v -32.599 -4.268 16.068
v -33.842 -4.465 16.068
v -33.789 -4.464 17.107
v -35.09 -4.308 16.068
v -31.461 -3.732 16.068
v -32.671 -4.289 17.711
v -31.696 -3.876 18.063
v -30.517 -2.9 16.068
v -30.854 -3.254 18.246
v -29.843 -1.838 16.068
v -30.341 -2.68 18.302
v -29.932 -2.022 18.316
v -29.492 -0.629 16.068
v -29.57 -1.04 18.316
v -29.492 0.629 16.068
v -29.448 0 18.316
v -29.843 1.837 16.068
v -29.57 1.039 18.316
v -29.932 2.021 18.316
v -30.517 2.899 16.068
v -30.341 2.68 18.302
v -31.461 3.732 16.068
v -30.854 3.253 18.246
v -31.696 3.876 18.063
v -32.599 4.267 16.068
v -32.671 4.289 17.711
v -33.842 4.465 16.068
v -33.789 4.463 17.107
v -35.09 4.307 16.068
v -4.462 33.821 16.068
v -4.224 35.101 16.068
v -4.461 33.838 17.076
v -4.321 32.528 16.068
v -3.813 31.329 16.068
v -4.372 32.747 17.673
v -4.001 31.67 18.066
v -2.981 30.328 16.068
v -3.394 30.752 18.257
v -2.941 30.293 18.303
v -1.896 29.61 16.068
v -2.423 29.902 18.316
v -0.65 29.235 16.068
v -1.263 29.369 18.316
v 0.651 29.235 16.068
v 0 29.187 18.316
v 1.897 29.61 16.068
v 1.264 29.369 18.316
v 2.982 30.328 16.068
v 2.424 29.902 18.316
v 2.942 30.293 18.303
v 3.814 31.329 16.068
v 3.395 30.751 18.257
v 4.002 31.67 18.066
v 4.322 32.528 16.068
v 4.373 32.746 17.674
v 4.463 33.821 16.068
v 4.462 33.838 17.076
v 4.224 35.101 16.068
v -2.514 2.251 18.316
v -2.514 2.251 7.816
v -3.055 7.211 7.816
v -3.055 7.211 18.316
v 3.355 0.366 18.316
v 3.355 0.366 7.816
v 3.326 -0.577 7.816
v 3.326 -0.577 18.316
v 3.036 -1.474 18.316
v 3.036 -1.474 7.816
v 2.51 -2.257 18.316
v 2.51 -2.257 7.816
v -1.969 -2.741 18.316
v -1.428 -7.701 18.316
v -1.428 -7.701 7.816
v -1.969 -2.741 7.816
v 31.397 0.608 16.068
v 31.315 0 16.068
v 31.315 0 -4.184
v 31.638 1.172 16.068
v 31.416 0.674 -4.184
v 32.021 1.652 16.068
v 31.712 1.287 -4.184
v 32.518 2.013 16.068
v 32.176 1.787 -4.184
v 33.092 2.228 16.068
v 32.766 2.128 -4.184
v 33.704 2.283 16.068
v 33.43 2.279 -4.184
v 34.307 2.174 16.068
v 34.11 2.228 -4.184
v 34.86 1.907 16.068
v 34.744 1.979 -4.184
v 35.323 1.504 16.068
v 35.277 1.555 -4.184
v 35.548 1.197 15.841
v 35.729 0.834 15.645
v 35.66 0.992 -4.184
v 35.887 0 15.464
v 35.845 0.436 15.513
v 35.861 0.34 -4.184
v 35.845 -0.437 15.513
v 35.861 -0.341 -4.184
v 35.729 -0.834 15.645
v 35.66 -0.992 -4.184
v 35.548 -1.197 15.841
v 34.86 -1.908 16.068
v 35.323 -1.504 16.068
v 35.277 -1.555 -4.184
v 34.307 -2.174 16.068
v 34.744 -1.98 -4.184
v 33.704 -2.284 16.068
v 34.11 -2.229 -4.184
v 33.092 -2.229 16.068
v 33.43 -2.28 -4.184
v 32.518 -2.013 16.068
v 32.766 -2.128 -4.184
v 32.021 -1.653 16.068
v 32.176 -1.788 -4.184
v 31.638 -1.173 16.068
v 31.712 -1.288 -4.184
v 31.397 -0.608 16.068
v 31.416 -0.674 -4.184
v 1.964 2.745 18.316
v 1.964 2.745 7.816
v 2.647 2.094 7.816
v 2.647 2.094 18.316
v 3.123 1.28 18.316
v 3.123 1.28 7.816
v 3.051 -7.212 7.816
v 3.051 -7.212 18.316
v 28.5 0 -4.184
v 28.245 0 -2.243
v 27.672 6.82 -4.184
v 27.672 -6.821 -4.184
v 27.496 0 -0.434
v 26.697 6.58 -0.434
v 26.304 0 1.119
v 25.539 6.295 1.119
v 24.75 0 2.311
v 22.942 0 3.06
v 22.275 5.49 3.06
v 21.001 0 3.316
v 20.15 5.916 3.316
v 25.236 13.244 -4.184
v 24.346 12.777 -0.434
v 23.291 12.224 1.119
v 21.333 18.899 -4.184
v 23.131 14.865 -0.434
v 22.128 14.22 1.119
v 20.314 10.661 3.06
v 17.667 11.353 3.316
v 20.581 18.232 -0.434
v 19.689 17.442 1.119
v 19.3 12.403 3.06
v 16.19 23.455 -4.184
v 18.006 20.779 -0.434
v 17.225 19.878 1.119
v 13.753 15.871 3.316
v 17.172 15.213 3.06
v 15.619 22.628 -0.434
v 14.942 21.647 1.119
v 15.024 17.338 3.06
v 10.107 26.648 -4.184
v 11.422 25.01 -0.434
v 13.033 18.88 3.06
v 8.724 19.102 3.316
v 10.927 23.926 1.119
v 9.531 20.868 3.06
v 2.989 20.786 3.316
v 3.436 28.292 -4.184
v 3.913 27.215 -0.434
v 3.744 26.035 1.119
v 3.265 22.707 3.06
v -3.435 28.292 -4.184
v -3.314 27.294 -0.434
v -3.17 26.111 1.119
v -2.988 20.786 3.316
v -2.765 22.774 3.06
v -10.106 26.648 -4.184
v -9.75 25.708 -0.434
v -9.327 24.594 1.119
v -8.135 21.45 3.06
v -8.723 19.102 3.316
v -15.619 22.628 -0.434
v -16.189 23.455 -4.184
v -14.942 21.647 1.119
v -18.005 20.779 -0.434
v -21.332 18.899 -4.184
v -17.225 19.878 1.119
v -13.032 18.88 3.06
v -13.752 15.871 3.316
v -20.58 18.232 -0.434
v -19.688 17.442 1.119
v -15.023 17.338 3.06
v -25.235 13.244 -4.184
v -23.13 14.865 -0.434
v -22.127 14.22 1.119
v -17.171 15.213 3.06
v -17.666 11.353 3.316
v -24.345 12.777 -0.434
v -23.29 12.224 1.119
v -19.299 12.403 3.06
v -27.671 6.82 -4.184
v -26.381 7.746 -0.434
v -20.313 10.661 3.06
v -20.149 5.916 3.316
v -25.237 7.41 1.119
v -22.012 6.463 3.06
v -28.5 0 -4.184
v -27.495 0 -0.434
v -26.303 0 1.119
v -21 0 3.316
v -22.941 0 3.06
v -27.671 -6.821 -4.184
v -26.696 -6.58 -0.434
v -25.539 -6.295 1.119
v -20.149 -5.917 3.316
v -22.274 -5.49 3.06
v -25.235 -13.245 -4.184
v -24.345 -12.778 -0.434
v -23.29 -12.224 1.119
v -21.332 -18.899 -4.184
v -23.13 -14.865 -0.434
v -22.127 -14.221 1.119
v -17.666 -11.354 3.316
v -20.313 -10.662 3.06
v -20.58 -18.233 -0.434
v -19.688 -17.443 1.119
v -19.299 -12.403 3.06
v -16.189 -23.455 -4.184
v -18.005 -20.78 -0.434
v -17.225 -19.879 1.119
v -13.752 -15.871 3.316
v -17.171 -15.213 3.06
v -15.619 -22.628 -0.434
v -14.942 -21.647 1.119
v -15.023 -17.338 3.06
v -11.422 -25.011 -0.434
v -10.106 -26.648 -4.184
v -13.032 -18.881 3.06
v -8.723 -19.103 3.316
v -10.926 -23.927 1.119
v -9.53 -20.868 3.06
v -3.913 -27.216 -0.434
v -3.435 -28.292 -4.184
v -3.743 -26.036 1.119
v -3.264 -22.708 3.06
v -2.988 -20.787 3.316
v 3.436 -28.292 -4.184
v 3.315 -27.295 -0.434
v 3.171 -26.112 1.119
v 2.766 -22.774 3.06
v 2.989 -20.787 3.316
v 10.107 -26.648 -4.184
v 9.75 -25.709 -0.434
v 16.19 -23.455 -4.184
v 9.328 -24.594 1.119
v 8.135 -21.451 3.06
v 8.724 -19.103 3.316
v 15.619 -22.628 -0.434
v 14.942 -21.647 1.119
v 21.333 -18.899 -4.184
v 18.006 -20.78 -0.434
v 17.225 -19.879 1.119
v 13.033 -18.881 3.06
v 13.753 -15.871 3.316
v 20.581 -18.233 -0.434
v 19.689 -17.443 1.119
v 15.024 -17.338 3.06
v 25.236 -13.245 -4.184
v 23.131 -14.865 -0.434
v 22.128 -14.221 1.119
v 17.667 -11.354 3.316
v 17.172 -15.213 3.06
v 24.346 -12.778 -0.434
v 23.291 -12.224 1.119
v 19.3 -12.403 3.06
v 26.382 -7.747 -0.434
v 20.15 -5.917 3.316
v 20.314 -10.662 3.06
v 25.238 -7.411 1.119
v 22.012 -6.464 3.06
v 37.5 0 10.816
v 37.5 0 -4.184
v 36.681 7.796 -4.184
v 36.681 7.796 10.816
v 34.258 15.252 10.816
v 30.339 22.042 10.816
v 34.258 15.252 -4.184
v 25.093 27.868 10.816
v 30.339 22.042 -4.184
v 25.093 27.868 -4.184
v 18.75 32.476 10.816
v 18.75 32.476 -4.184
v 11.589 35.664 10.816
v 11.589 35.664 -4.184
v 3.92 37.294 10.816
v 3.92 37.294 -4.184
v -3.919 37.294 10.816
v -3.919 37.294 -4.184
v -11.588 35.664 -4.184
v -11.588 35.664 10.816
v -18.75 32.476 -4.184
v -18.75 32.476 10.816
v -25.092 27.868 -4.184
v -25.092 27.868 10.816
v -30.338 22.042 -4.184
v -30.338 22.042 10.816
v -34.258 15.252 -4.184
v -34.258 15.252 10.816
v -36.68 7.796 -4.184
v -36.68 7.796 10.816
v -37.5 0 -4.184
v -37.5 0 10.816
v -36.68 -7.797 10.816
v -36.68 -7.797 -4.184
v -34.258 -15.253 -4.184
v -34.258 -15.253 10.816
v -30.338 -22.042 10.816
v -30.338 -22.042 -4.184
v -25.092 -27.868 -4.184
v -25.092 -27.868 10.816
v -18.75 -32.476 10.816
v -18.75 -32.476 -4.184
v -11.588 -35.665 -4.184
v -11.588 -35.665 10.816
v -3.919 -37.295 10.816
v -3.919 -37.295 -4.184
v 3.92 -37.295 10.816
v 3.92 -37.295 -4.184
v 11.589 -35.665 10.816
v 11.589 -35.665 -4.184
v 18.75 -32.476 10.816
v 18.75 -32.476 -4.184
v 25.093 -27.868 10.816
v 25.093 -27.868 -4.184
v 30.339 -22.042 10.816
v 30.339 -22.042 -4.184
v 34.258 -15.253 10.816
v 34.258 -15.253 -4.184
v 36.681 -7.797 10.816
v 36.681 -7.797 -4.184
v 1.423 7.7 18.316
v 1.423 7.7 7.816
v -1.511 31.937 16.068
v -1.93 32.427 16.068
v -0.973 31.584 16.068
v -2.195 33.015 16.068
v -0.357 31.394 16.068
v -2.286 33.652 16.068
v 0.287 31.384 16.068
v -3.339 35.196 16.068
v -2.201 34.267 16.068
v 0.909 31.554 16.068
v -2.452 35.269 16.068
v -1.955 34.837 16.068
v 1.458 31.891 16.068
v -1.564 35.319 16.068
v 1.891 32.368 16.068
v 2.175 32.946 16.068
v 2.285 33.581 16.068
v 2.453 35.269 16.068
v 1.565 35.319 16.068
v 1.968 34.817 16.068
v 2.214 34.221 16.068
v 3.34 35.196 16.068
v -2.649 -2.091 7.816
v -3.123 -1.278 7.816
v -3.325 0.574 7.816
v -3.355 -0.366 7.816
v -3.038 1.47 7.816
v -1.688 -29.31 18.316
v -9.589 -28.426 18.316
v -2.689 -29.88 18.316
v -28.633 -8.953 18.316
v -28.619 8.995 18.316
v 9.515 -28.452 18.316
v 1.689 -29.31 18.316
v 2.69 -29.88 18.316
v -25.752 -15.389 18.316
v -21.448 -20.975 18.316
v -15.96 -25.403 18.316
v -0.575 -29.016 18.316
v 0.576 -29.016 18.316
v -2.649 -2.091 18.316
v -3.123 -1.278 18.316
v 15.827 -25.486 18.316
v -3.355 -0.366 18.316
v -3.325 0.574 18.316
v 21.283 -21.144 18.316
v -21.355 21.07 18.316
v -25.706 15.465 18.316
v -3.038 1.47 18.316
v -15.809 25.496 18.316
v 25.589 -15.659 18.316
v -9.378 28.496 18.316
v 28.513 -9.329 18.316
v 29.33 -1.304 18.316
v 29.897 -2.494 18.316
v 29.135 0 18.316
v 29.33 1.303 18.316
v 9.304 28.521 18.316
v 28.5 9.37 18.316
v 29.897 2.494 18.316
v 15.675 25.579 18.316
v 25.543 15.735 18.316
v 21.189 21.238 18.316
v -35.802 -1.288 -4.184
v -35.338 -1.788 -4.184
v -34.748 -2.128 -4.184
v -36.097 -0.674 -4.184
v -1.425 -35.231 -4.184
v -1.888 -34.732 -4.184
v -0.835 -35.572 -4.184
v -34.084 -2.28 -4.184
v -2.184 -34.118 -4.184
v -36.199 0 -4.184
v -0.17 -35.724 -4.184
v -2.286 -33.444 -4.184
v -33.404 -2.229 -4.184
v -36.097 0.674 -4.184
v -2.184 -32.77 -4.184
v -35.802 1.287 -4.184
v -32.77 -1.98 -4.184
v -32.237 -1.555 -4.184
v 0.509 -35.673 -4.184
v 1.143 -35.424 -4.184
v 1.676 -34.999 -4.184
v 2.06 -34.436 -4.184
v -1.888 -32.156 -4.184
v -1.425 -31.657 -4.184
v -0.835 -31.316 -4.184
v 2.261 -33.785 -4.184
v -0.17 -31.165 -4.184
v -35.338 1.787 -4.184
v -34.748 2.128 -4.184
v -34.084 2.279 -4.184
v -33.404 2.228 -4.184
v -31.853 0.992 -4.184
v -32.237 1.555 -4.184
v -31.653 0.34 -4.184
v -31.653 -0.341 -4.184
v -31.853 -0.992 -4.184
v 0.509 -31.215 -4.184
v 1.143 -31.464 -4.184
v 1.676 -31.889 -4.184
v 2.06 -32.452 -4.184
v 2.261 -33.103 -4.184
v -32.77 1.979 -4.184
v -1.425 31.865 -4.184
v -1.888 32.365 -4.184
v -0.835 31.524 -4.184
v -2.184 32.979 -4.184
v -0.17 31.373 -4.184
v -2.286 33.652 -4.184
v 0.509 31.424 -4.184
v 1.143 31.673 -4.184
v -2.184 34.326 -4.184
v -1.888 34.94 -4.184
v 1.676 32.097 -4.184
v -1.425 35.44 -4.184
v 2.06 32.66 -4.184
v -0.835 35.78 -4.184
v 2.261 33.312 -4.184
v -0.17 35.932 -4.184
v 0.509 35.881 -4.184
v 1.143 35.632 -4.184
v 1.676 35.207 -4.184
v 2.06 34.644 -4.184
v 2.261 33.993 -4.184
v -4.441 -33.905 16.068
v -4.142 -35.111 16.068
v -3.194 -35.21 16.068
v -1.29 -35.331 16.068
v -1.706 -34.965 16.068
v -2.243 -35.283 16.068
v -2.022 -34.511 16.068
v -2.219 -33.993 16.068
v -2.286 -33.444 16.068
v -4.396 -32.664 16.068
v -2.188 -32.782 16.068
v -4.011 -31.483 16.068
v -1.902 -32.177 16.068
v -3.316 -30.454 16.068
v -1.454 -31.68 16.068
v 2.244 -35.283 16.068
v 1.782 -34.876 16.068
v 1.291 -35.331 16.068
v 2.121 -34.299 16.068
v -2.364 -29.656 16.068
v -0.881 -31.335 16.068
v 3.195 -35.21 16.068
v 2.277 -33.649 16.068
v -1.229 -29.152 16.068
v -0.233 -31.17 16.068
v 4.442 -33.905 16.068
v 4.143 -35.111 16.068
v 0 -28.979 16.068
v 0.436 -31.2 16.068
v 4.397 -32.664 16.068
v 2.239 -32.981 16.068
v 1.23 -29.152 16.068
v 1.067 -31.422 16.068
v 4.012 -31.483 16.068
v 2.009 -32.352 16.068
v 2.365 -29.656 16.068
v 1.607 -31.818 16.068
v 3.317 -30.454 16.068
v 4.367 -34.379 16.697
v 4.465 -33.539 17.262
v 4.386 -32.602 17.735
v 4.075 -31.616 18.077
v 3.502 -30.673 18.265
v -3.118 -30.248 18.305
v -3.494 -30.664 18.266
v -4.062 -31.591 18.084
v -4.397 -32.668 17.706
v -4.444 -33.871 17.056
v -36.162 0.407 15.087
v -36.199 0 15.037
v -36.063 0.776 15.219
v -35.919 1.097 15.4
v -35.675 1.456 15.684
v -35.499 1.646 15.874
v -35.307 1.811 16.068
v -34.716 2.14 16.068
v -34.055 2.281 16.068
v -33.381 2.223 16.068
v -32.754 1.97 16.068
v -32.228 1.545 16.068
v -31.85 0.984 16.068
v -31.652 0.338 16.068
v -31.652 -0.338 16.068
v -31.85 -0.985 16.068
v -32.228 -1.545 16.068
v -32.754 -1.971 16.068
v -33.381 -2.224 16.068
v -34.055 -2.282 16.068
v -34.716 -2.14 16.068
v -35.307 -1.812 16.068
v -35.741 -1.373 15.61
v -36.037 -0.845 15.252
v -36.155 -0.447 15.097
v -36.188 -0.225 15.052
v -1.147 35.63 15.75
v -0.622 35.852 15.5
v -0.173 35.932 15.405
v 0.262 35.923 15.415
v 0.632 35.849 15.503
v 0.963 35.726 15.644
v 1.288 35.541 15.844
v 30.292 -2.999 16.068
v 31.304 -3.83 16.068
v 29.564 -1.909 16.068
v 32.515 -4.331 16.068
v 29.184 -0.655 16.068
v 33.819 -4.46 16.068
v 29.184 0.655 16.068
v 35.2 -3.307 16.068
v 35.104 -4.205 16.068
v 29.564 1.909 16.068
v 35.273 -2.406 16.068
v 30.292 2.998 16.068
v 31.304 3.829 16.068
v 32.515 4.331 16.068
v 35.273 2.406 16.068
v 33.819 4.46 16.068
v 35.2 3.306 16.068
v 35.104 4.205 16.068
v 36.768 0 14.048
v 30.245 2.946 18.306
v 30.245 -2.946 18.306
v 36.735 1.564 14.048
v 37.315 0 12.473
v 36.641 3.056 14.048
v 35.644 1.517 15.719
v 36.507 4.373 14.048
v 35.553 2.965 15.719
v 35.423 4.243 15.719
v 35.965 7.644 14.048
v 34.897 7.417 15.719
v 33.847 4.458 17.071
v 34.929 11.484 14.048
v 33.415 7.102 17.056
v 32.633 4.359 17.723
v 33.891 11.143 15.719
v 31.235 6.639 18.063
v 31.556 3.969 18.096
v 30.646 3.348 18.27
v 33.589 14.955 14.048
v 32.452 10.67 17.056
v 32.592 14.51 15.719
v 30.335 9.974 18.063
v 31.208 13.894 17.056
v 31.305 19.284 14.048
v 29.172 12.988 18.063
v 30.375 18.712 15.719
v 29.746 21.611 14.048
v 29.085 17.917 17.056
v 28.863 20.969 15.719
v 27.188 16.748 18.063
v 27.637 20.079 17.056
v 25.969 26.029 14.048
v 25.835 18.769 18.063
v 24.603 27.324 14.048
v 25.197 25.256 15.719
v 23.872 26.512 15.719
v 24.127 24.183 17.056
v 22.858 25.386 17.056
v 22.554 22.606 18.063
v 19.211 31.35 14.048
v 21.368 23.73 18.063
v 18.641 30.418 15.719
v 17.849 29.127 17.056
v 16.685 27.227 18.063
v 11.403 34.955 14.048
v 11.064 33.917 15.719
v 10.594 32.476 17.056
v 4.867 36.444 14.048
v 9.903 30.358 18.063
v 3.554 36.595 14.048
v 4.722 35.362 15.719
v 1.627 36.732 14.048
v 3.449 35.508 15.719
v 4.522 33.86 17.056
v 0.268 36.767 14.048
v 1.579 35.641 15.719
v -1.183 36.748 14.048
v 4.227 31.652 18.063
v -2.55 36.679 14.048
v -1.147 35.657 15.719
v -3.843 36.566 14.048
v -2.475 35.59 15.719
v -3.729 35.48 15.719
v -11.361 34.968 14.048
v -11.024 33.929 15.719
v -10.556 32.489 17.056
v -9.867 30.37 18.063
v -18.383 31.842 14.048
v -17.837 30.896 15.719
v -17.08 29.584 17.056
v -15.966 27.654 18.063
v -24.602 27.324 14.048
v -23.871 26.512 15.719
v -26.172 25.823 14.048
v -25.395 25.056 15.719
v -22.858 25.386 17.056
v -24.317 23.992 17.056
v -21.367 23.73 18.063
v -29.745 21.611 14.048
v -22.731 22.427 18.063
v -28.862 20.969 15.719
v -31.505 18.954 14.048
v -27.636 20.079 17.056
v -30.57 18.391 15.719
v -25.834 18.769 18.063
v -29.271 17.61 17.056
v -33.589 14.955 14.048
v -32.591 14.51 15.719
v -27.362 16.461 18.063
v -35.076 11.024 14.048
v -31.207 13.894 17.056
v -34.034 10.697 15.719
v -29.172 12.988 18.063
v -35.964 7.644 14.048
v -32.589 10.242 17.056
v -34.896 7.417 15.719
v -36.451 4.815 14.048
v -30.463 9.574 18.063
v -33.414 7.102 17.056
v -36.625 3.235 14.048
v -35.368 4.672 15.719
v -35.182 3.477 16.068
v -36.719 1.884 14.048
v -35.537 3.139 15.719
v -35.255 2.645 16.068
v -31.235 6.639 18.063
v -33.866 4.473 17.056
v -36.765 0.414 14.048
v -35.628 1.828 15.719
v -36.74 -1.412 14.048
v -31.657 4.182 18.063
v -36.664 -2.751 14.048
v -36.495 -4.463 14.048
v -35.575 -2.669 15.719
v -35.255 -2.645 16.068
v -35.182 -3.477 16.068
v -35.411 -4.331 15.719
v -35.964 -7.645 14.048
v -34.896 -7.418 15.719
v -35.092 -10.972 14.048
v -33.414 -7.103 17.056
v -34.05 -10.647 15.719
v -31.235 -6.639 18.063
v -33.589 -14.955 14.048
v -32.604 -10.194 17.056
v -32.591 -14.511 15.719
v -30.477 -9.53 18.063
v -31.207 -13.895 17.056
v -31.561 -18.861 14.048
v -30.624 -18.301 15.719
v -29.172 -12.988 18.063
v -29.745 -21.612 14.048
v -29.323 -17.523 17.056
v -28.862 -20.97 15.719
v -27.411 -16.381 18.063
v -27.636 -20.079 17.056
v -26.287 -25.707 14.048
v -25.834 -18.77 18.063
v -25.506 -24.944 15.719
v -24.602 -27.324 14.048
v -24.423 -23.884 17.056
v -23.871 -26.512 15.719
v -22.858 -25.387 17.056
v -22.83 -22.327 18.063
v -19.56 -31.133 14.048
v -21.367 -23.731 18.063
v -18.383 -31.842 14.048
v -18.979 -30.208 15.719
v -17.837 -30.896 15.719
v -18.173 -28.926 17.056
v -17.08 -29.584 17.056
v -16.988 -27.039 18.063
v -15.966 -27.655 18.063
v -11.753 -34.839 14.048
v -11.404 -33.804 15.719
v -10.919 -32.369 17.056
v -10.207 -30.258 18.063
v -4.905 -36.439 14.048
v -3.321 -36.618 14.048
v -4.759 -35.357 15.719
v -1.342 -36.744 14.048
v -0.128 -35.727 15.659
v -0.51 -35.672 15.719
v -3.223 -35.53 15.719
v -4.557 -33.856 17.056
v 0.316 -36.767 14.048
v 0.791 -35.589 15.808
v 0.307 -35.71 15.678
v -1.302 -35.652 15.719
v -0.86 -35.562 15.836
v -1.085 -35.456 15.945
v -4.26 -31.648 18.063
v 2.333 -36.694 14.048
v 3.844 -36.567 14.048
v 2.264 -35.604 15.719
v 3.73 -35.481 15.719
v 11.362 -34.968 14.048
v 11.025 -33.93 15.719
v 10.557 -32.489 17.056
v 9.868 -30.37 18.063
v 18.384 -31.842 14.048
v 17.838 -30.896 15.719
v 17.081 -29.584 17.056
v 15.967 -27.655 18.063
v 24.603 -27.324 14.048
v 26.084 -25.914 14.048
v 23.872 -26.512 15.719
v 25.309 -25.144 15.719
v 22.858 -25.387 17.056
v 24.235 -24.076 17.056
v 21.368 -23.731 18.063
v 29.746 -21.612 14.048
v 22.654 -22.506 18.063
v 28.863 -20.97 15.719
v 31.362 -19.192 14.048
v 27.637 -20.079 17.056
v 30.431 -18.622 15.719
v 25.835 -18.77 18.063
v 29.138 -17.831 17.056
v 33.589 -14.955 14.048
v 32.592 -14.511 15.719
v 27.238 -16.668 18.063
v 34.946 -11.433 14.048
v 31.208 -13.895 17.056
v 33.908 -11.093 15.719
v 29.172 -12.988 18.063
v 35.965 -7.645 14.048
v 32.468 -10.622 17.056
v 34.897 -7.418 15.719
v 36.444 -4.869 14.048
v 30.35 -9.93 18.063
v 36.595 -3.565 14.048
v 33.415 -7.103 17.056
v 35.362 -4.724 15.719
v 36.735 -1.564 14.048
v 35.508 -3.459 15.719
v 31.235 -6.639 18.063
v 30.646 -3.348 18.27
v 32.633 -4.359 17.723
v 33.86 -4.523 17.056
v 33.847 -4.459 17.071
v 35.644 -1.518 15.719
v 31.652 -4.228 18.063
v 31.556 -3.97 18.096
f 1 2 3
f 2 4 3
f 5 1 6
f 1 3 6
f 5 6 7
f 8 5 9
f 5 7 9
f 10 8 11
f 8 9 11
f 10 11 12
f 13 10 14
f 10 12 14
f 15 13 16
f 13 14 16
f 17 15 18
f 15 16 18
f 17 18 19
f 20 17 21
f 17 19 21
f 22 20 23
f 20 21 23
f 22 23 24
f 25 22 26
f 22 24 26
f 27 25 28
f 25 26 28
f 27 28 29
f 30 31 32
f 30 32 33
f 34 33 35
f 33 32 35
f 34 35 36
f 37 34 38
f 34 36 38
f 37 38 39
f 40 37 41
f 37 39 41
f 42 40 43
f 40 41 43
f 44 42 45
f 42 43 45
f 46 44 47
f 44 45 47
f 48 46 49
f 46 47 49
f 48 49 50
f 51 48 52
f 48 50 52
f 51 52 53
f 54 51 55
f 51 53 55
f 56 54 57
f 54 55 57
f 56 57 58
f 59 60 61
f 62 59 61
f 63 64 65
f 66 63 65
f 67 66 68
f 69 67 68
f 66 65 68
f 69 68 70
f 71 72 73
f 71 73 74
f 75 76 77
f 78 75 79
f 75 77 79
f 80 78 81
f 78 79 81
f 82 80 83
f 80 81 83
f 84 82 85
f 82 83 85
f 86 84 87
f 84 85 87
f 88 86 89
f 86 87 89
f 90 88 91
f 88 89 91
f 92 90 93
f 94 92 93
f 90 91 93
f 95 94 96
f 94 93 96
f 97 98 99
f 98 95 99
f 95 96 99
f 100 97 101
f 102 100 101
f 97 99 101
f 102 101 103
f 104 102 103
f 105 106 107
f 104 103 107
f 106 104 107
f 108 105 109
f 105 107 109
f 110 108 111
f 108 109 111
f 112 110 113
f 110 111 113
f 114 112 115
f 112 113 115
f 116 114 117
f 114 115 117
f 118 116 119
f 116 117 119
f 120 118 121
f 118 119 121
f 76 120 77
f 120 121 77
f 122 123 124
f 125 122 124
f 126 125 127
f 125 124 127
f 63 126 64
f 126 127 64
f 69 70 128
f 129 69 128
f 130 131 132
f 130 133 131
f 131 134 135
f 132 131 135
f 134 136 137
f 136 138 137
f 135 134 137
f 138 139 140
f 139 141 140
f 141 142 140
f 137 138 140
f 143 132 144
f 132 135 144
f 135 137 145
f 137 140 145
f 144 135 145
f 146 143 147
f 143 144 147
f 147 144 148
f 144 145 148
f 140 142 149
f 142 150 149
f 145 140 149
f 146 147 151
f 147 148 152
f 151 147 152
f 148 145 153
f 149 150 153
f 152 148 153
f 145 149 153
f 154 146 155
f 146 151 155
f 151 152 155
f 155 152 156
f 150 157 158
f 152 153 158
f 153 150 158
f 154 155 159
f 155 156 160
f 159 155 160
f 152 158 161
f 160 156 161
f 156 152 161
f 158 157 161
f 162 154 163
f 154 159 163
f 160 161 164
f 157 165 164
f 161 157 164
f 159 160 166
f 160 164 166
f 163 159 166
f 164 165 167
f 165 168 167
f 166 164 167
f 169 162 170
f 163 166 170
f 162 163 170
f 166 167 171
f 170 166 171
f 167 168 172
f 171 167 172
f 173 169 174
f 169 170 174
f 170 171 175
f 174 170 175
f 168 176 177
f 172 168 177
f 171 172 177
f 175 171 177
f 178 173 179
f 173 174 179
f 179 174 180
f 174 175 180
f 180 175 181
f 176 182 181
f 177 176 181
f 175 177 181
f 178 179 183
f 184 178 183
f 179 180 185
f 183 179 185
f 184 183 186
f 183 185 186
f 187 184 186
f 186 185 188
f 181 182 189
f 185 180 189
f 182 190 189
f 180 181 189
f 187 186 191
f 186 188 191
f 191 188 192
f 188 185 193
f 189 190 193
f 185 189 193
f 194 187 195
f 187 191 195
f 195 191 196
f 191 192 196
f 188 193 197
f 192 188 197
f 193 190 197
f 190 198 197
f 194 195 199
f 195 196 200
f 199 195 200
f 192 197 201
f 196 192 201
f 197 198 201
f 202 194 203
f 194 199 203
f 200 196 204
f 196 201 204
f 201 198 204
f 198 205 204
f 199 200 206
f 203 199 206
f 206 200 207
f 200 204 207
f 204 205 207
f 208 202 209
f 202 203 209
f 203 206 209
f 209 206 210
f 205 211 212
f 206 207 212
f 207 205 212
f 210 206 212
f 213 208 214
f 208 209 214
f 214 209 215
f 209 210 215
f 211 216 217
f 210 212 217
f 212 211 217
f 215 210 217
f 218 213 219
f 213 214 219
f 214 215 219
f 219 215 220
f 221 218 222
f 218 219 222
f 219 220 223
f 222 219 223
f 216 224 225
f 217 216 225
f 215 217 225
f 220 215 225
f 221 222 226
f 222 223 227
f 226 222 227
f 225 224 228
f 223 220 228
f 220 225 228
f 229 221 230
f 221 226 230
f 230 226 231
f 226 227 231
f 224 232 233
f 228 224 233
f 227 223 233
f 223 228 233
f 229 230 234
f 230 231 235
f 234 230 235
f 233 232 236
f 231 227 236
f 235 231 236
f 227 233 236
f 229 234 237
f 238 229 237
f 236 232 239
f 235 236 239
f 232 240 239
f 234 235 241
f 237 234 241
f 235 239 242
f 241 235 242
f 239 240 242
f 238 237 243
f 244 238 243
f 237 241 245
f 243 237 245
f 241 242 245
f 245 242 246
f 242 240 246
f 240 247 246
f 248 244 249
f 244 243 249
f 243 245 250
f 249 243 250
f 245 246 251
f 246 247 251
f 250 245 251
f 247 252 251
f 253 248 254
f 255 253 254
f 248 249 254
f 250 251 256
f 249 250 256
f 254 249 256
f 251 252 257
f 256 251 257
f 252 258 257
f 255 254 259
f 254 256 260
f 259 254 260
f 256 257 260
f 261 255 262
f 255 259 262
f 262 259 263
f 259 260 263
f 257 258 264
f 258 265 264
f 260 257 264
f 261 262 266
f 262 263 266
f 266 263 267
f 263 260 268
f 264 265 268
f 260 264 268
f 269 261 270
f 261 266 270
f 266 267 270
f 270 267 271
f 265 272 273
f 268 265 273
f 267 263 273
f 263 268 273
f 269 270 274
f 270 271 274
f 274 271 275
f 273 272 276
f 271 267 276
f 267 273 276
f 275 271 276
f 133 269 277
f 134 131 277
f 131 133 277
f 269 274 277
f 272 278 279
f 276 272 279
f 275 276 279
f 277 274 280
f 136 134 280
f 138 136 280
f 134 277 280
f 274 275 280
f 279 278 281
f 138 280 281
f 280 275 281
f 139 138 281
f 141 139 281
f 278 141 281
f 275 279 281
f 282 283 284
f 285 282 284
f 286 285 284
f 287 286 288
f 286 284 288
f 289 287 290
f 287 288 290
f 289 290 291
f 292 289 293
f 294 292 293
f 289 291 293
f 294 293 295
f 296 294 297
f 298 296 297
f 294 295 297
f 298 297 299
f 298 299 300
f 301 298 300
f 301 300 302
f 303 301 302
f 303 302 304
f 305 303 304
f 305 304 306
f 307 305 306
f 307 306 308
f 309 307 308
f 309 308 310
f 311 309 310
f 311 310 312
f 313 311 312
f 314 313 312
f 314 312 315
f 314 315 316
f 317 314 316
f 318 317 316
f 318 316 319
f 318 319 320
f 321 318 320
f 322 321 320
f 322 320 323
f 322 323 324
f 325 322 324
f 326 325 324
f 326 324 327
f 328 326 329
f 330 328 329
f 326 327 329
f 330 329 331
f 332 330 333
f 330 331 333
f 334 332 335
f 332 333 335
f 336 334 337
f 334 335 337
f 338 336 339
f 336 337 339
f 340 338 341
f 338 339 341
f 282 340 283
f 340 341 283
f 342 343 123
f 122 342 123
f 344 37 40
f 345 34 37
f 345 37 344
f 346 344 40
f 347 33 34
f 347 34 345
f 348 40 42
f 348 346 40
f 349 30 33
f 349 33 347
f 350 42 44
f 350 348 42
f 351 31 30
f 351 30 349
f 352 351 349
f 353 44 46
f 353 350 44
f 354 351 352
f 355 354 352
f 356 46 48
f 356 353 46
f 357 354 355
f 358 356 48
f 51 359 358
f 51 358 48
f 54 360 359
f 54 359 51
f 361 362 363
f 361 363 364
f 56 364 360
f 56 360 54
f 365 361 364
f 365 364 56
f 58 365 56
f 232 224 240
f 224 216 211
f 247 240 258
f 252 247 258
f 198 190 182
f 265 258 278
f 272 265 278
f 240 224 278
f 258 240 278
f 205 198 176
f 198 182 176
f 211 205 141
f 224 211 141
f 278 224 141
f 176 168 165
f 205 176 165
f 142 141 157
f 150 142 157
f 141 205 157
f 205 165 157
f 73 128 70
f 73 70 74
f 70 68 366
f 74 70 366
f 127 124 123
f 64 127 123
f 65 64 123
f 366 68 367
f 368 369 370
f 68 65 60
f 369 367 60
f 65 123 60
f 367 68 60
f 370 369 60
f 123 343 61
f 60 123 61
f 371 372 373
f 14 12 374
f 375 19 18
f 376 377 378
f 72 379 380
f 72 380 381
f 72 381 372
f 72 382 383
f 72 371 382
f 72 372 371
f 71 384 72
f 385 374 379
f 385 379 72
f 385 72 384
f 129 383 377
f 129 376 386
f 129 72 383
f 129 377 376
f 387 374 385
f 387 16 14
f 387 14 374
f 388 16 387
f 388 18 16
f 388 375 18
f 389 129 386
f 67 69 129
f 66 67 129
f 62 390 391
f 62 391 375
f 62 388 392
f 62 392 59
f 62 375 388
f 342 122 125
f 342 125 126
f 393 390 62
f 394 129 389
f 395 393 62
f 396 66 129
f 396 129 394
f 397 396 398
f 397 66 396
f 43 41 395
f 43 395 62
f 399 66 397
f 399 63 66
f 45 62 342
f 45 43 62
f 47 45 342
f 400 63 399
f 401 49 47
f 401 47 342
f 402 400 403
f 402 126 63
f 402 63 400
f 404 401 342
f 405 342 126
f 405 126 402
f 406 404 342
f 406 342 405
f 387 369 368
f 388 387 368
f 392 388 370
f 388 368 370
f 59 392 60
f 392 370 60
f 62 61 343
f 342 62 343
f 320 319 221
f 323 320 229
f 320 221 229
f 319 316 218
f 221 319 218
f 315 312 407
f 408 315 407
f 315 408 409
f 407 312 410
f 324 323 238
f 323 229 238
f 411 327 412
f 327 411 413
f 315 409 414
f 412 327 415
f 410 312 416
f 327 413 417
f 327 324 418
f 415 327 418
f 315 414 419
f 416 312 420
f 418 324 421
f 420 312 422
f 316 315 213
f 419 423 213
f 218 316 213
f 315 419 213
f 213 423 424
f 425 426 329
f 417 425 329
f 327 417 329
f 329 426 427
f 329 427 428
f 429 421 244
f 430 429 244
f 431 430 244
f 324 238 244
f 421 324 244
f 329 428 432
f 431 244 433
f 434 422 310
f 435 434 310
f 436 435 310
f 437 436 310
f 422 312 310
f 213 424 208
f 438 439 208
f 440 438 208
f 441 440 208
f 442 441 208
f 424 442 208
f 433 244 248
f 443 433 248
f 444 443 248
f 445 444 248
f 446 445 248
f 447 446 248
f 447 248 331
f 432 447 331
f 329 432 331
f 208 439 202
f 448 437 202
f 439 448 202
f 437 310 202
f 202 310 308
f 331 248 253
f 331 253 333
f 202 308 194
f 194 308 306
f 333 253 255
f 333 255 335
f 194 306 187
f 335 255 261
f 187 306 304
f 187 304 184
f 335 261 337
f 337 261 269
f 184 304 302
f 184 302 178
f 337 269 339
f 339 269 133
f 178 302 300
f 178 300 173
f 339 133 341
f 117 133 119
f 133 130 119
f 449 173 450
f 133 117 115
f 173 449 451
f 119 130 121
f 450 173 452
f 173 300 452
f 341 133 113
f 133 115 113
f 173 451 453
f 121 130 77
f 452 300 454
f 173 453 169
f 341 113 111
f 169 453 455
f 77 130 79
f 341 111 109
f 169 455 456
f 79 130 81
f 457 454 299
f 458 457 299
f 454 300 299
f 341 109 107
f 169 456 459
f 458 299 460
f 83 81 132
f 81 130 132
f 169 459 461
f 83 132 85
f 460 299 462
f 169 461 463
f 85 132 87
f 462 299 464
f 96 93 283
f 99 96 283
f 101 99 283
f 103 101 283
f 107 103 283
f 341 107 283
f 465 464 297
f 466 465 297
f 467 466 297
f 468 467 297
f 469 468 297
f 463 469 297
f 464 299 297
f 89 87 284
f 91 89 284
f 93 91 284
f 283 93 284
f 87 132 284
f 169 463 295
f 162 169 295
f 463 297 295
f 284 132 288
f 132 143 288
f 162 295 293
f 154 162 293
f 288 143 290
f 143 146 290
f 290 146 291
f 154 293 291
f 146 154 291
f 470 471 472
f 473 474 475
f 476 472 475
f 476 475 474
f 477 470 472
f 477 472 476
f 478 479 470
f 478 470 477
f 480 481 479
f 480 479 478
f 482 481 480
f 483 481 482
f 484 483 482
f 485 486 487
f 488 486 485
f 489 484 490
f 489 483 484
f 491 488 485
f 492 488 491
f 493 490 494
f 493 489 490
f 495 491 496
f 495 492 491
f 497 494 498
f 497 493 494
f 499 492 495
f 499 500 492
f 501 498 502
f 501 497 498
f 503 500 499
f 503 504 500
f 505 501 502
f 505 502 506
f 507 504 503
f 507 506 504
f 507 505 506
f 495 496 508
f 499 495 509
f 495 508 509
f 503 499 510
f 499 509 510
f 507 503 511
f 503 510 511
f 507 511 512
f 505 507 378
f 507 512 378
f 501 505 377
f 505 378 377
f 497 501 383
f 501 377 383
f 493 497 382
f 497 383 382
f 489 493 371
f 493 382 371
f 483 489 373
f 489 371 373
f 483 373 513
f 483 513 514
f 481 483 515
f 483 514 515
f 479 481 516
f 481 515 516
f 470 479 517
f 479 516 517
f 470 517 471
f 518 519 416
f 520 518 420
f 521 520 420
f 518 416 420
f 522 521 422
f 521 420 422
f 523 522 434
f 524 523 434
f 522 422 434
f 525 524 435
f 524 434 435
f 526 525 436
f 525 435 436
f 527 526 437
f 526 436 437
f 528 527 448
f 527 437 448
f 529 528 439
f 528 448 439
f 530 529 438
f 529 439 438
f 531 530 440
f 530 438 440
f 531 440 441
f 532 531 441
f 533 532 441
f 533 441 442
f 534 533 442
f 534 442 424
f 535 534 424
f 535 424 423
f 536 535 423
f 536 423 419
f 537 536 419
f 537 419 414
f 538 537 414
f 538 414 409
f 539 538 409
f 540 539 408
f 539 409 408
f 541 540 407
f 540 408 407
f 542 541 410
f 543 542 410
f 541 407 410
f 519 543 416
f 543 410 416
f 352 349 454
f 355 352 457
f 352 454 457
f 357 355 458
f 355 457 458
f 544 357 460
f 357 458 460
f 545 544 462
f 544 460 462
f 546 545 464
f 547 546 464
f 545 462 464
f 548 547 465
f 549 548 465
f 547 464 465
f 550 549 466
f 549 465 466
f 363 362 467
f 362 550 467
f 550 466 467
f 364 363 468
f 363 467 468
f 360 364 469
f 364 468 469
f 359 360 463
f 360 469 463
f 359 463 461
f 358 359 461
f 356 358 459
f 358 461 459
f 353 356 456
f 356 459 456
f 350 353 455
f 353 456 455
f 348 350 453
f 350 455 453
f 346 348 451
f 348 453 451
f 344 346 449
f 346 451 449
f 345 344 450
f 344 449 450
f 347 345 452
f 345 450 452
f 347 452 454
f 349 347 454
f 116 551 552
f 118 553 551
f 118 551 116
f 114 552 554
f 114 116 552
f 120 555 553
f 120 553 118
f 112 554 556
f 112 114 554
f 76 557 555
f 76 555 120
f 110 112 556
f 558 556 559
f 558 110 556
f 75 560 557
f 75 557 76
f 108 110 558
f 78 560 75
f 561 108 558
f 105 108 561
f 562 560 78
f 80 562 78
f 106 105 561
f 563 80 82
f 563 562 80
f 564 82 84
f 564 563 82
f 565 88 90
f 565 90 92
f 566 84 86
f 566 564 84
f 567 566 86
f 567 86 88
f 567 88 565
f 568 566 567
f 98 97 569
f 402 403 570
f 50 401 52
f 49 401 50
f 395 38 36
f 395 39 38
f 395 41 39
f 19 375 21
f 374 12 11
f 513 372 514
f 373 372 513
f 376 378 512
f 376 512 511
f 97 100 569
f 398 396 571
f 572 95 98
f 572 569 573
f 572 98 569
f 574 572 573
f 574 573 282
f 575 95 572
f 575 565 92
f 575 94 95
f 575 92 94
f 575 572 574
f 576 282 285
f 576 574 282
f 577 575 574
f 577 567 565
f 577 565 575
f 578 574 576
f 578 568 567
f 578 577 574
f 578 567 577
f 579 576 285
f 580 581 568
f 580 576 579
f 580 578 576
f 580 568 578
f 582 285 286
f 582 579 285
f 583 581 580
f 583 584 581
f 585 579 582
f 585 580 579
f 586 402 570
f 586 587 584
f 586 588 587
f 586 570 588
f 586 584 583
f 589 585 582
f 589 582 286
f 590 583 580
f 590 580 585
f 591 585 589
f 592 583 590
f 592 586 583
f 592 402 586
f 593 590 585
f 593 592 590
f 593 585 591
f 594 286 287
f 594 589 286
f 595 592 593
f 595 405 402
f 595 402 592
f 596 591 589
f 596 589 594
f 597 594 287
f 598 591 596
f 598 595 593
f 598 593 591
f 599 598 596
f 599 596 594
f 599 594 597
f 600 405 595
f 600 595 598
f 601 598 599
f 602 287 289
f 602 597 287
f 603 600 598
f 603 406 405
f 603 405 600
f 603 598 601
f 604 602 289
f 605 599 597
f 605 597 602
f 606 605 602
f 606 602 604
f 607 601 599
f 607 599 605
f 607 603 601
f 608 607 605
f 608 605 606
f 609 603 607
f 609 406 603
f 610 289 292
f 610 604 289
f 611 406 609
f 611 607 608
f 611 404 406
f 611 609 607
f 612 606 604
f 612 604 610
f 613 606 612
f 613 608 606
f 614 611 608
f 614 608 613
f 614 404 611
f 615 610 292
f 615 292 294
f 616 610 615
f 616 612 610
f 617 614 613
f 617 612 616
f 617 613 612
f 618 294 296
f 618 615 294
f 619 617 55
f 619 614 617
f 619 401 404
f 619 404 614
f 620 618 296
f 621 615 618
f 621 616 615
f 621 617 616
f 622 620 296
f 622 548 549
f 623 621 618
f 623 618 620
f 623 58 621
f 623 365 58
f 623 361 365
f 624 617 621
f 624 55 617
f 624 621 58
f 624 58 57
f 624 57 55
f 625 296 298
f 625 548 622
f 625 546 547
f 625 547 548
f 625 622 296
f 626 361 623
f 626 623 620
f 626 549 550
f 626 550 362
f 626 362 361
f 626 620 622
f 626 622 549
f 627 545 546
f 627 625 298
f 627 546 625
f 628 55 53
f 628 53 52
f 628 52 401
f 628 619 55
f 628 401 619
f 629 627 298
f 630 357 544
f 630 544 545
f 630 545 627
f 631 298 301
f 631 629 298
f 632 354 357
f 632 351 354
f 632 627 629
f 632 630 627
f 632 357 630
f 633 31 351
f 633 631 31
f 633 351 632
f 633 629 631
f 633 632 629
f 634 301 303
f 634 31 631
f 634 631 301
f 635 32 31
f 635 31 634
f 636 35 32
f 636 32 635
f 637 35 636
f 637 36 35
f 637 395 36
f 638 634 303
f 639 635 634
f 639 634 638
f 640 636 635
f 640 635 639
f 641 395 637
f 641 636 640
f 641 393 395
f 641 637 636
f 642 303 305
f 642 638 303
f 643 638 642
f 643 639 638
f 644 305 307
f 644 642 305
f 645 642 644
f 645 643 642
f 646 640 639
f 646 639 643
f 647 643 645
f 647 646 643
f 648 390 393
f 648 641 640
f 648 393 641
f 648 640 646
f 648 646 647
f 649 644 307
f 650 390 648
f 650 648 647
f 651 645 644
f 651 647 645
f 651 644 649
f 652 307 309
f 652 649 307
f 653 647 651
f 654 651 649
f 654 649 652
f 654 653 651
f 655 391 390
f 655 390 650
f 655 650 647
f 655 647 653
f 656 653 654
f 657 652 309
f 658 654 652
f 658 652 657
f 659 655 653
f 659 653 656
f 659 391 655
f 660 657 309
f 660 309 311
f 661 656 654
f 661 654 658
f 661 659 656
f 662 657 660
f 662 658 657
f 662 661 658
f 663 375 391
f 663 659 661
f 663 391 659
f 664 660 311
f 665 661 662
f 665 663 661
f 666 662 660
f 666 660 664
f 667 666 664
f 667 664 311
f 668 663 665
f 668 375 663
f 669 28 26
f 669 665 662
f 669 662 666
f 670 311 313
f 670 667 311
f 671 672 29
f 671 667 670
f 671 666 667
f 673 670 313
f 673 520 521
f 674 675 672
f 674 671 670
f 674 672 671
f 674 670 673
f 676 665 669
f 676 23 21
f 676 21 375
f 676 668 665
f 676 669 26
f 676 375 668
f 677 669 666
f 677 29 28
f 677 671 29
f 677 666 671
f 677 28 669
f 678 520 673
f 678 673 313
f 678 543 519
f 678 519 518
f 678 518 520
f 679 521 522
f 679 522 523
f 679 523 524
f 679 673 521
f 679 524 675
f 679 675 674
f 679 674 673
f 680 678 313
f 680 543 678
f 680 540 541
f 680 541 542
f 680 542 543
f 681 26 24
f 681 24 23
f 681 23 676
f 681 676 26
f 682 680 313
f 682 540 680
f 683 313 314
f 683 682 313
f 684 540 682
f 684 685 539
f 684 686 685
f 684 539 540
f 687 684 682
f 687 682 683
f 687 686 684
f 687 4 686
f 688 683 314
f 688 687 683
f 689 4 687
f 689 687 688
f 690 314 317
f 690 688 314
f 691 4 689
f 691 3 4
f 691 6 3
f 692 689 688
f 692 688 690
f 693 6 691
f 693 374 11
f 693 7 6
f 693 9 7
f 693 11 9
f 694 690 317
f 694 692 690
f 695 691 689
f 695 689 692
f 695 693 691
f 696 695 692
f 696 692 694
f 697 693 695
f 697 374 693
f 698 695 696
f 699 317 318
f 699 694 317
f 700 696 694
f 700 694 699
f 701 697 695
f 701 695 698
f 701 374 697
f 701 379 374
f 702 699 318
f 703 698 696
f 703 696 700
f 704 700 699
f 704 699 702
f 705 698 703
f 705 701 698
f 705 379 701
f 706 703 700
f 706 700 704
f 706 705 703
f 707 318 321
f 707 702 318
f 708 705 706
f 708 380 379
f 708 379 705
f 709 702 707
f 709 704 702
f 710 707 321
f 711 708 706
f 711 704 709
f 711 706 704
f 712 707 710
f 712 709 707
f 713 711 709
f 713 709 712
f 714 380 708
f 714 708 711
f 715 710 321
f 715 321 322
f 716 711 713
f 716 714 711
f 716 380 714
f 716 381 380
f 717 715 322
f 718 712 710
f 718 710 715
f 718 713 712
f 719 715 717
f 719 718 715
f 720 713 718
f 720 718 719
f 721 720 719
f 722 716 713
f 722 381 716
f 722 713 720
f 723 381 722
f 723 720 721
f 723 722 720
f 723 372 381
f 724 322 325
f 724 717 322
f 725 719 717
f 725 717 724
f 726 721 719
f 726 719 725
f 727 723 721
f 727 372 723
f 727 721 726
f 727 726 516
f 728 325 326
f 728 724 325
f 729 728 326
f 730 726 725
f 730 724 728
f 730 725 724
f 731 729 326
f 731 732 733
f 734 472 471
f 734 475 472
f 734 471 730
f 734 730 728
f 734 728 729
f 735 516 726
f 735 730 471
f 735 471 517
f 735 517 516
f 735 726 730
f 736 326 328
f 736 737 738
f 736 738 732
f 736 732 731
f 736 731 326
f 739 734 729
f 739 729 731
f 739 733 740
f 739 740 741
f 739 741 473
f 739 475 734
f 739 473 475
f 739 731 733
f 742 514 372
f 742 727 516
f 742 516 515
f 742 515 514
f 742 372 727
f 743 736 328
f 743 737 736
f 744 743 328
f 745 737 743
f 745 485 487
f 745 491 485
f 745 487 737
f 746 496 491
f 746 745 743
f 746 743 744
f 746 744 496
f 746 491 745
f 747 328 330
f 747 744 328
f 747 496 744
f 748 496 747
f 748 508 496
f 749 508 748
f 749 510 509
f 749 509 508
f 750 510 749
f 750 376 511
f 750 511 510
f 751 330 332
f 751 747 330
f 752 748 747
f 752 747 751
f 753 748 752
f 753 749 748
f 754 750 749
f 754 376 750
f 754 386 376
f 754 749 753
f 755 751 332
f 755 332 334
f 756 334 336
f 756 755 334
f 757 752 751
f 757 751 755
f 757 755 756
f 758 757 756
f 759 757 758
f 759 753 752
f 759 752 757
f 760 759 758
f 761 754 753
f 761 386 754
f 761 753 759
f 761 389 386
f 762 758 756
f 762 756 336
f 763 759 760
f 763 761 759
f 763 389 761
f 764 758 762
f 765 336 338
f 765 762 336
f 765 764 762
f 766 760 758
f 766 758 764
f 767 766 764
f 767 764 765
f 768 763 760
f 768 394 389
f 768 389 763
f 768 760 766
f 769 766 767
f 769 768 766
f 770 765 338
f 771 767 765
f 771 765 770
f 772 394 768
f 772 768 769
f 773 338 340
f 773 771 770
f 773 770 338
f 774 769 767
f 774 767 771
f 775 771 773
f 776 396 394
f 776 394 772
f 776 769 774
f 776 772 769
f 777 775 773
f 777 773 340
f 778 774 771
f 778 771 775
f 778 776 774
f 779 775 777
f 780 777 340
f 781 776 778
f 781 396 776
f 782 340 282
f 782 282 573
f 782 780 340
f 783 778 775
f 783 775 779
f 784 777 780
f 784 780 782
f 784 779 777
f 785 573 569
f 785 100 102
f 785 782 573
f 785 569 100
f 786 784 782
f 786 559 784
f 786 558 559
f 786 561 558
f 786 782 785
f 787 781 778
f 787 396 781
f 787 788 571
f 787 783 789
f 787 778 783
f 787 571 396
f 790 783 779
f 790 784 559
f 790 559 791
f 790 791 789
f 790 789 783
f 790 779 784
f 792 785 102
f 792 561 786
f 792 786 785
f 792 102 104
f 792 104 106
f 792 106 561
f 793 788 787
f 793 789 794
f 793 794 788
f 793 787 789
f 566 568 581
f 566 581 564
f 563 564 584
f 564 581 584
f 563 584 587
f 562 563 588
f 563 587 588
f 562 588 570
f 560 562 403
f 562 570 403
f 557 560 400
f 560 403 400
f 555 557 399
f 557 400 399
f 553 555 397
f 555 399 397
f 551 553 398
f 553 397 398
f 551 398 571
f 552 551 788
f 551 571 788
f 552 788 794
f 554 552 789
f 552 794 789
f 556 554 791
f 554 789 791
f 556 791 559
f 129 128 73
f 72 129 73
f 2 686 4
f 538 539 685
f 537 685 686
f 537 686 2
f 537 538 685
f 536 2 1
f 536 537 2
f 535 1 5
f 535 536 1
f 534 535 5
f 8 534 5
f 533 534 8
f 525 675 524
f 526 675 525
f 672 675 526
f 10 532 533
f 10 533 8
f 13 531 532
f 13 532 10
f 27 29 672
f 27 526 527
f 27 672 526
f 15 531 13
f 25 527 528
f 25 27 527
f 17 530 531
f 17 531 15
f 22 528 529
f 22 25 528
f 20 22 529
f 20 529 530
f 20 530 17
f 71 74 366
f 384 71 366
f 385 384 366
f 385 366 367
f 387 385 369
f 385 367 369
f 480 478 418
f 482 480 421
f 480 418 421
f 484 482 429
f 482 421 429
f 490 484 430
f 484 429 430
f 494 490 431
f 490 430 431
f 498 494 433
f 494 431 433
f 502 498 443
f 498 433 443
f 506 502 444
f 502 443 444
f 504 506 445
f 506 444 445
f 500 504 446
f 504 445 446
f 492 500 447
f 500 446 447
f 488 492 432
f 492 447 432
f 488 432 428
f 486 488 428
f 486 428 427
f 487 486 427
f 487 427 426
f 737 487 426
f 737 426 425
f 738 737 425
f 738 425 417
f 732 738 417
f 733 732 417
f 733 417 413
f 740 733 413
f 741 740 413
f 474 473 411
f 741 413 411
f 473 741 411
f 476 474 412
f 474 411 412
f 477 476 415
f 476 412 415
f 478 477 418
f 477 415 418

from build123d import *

# Parameters (mm, degrees)
SKETCH1_R                                           = 25
SKETCH1_R_2                                         = 19
BOSS_EXTRUDE1_DEPTH                                 = 5
SKETCH2_R                                           = 25
BOSS_EXTRUDE2_DEPTH                                 = 10
FILLET1_R                                           = 5
CBORE_FOR_3_BINDING_HEAD_MACHINE_SCREW1_D           = 3.048
CBORE_FOR_3_BINDING_HEAD_MACHINE_SCREW1_CBORE_D     = 5.95376
CBORE_FOR_3_BINDING_HEAD_MACHINE_SCREW1_CBORE_DEPTH = 1.4986
CUT_EXTRUDE1_START                                  = -3
CUT_EXTRUDE1_DEPTH                                  = 10
SCALE1_SCALE                                        = 1.5


with BuildPart() as part:
    # Sketch1 → Boss-Extrude1 (new body)
    with BuildSketch(Plane.XY):
        Circle(SKETCH1_R)
        Circle(SKETCH1_R_2, mode=Mode.SUBTRACT)
    extrude(amount=BOSS_EXTRUDE1_DEPTH)

    # Sketch2 → Boss-Extrude2 (add)
    with BuildSketch(Plane.XY.offset(5)):
        Circle(SKETCH2_R)
    extrude(amount=BOSS_EXTRUDE2_DEPTH)

    # Fillet1
    fillet1_edges = [part.edges().sort_by_distance(p)[0] for p in [
        (-25, 0, 15),
        (-19, 0, 5),
    ]]
    fillet(fillet1_edges, radius=FILLET1_R - 0.0001)  # a hair under: the kernel refuses the full size

    # CBORE for #3 Binding Head Machine Screw1 (through all)
    with Locations(Plane.XY.offset(15)):
        with Locations((0, 22.435050854), (0, -22.295918756), (22.400267829, 0), (-22.608965977, 0)):
            CounterBoreHole(CBORE_FOR_3_BINDING_HEAD_MACHINE_SCREW1_D / 2, CBORE_FOR_3_BINDING_HEAD_MACHINE_SCREW1_CBORE_D / 2, CBORE_FOR_3_BINDING_HEAD_MACHINE_SCREW1_CBORE_DEPTH)

    # Sketch15 → Cut-Extrude1 (cut)
    with BuildSketch(Plane(origin=(0, 0, 5), x_dir=(-1, 0, 0), z_dir=(0, 0, -1)).offset(CUT_EXTRUDE1_START)):
        with BuildLine():
            Line((1.676226843, 1.500920907), (2.037127027, 4.807341739))
            Line((2.037127027, 4.807341739), (-0.948609283, 5.133238785))
            Line((-0.948609283, 5.133238785), (-1.309172026, 1.829909453))
            ThreePointArc((-1.309172026, 1.829909453), (-1.94216249, 1.136003901), (-2.236715327, 0.244140421))
            ThreePointArc((-2.236715327, 0.244140421), (-2.141502308, -0.690266516), (-1.673115077, -1.504388892))
            Line((-1.673115077, -1.504388892), (-2.03367782, -4.807718225))
            Line((-2.03367782, -4.807718225), (0.952058491, -5.133615271))
            Line((0.952058491, -5.133615271), (1.312958675, -1.827194439))
            ThreePointArc((1.312958675, -1.827194439), (1.943337692, -1.133992334), (2.236715327, -0.244140421))
            ThreePointArc((2.236715327, -0.244140421), (2.142215878, 0.688048787), (1.676226843, 1.500920907))
        make_face()
    extrude(amount=-CUT_EXTRUDE1_DEPTH, mode=Mode.SUBTRACT)


with BuildPart() as part_1:
    # Scale1: scaled about (-0.000833746, 0.000507816, 8.367914089)
    add(part.part.scale(SCALE1_SCALE).moved(Location((0.000416873, -0.000253908, -4.183957044))))


solid = part_1.part
